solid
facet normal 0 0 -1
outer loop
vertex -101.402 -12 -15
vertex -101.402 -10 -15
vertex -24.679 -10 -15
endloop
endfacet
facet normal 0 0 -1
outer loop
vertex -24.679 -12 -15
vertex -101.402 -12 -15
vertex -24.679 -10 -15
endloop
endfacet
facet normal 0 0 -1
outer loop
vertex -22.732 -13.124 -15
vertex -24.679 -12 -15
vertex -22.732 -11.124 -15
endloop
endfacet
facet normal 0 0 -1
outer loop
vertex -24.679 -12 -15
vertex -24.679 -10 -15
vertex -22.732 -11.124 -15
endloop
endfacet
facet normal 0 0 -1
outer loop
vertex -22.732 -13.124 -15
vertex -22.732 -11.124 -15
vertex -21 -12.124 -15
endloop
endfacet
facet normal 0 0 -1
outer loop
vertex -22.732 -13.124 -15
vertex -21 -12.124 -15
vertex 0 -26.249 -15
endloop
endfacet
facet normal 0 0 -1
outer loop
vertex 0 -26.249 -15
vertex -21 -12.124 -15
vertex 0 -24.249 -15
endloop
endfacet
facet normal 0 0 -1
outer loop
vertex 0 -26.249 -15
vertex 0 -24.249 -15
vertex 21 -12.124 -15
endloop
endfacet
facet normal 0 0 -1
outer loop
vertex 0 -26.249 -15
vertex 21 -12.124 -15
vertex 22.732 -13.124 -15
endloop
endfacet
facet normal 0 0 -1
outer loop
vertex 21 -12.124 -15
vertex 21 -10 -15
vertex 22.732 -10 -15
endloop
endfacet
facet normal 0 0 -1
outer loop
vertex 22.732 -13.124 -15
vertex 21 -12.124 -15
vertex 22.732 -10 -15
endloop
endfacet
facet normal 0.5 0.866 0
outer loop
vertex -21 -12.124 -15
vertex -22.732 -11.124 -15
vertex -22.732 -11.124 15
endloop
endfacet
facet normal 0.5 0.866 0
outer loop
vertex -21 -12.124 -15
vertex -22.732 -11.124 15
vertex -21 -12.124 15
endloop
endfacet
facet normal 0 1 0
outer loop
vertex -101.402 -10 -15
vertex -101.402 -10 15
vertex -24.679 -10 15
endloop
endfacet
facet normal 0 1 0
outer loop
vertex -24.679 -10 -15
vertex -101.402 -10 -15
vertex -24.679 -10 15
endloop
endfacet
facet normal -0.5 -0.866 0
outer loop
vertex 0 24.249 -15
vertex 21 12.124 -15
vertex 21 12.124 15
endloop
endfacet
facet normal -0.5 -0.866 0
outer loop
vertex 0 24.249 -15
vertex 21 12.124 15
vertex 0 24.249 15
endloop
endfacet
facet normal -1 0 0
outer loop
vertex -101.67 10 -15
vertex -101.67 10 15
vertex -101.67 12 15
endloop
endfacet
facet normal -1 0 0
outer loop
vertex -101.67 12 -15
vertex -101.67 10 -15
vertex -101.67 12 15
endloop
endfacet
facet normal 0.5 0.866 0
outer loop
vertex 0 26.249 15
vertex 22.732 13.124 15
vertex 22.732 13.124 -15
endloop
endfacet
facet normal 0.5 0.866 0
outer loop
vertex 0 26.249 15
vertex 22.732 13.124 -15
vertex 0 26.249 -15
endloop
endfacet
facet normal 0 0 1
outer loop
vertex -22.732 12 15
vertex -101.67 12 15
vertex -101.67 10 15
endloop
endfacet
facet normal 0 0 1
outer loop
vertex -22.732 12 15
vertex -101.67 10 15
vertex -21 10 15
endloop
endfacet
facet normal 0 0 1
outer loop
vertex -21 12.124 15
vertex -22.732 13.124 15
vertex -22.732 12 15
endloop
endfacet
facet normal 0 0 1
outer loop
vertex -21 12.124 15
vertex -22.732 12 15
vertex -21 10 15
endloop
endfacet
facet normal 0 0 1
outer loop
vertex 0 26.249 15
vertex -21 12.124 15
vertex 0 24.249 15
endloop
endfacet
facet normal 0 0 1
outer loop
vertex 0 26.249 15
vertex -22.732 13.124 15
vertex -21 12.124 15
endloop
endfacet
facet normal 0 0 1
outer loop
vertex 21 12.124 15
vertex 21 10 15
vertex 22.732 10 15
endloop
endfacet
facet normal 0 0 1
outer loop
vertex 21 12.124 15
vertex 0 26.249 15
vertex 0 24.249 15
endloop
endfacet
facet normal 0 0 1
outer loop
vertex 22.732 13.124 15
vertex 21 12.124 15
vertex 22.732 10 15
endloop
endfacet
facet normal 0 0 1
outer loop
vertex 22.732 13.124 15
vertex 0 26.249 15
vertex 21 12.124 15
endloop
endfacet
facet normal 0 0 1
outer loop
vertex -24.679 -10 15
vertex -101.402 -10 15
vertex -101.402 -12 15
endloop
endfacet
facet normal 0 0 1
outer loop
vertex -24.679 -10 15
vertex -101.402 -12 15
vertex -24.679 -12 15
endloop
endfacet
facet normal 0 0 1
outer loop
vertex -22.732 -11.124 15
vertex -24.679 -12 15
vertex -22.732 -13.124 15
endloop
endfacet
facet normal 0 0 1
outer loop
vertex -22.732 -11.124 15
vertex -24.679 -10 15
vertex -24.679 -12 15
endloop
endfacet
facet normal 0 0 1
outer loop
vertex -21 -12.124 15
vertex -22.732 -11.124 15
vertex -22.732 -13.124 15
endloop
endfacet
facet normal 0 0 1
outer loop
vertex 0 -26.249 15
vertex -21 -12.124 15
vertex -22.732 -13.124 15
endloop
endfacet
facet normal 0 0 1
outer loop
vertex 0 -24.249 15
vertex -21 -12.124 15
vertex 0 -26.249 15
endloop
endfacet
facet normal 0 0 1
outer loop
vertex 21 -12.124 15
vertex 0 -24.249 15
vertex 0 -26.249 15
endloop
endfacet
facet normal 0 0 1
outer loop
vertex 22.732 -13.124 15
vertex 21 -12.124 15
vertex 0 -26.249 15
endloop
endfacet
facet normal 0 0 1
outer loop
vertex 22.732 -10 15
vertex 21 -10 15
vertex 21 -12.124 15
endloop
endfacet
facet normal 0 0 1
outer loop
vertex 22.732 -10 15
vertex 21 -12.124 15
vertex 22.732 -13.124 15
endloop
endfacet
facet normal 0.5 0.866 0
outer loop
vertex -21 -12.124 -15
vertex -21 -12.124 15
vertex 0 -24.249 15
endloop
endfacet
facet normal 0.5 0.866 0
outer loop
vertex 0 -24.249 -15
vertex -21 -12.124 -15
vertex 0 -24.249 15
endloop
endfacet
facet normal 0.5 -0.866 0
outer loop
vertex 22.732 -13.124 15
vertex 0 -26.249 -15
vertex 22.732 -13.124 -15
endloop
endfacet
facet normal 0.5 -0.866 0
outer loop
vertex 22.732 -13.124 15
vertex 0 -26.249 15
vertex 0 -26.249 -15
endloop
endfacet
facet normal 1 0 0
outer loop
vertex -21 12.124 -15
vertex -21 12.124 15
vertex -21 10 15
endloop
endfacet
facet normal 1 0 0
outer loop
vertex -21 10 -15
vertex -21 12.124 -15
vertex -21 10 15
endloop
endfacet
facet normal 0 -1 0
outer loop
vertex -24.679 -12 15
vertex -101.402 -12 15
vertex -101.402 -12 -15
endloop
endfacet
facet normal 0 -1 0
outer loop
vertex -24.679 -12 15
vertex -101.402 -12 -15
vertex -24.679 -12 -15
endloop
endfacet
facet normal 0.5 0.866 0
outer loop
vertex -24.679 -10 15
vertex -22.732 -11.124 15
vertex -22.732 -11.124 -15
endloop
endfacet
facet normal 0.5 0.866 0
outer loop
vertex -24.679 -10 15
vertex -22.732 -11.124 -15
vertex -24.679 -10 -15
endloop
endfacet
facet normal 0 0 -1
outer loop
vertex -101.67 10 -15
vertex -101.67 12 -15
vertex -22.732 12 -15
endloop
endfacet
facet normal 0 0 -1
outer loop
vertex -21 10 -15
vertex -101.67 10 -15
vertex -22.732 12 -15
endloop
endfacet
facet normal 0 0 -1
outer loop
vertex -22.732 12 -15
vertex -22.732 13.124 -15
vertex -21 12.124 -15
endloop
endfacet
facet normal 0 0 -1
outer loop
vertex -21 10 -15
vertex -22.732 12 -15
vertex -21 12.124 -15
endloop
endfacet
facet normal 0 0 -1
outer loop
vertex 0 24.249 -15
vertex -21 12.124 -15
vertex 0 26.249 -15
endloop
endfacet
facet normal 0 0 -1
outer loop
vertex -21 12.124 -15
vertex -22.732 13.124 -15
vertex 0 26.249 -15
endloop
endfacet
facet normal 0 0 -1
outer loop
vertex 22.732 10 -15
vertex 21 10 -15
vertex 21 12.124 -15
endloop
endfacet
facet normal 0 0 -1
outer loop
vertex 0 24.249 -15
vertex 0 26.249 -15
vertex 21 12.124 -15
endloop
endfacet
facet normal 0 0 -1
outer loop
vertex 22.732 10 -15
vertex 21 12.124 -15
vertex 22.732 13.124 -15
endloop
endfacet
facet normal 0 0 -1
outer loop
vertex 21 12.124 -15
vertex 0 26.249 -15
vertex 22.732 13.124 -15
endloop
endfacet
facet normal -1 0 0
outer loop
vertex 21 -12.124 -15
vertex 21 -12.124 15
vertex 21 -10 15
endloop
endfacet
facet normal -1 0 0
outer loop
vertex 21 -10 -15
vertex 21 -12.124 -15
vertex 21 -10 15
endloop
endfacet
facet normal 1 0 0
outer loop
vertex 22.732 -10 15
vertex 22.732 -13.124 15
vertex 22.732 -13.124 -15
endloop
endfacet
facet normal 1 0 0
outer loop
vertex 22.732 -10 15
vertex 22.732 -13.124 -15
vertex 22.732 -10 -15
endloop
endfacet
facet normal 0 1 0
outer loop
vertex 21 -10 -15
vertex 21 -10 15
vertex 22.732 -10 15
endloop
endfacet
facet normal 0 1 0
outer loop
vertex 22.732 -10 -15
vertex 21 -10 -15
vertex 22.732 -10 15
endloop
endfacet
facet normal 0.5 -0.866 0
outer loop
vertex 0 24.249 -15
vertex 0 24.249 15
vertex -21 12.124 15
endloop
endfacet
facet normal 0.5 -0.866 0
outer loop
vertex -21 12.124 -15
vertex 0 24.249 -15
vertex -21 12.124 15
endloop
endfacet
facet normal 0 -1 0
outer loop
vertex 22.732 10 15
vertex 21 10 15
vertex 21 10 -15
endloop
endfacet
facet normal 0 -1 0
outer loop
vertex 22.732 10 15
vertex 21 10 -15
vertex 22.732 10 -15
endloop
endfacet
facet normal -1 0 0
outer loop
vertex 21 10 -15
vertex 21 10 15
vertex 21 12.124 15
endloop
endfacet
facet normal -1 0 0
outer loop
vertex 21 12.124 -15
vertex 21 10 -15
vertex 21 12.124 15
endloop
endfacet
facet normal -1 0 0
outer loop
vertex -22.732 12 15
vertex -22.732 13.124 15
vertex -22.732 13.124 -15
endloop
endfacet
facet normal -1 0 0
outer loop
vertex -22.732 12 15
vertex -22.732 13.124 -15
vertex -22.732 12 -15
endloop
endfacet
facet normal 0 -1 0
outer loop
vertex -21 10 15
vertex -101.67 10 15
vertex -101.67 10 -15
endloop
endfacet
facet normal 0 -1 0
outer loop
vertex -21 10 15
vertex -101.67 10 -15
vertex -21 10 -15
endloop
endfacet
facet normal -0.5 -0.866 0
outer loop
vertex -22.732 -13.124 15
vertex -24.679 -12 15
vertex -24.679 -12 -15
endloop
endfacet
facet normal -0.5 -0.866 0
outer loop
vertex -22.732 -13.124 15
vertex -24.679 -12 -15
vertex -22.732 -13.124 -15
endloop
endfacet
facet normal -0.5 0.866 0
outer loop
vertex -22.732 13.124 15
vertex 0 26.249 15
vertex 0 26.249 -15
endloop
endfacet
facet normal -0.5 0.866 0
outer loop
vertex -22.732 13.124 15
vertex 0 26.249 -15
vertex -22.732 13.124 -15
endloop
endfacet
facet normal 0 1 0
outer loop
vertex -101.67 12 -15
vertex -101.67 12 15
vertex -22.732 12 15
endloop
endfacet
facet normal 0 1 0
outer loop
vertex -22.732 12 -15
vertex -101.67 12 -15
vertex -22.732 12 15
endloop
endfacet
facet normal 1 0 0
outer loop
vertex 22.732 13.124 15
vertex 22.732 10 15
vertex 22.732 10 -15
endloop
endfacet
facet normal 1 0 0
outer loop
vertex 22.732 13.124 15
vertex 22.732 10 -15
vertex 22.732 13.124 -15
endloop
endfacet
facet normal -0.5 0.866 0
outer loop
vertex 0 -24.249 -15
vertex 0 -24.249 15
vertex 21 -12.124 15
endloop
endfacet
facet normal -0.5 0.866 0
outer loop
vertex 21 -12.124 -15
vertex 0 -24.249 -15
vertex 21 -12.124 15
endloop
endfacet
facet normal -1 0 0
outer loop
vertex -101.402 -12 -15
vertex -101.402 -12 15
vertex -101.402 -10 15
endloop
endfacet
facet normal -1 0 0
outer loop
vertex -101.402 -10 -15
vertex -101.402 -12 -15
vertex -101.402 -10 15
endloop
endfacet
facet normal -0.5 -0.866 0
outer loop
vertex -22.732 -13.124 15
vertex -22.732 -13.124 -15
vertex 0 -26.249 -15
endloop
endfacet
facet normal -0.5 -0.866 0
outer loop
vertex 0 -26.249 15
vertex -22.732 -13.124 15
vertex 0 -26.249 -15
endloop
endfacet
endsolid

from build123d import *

# Parameters (mm, degrees)
F1_DEPTH  = 25
F3_DEPTH  = 15
F5_W      = 81.856458
F5_H      = 20
F6_DEPTH  = 15
F7_W      = 76.722559
F7_H      = 2
F8_DEPTH  = 15
F10_DEPTH = 15
F11_W     = 80.67
F11_H     = 2
F12_DEPTH = 15


with BuildPart() as f1:
    # F0 (on Top) → F1 (new body, symmetric)
    with BuildSketch(Plane.XY):
        Polygon((21, -12.124356), (21, 12.124356), (0, 24.248711), (-21, 12.124356), (-21, -12.124356), (0, -24.248711), align=None)
    extrude(amount=F1_DEPTH, both=True)


with BuildPart() as f3:
    # F2 (on Top) → F3 (new body, symmetric)
    with BuildSketch(Plane.XY):
        Polygon((0, -26.248711), (22.732051, -13.124356), (22.732051, 13.124356), (0, 26.248711), (-22.732051, 13.124356), (-22.732051, -13.124356), align=None)
    extrude(amount=F3_DEPTH, both=True)

    # F4: cut F1
    add(f1.part, mode=Mode.SUBTRACT)

    # F5 (on Top) → F6 (cut, symmetric)
    with BuildSketch(Plane.XY):
        Rectangle(F5_W, F5_H)
    extrude(amount=F6_DEPTH, both=True, mode=Mode.SUBTRACT)

    # F7 (on Top) → F8 (join, symmetric)
    with BuildSketch(Plane.XY):
        with Locations((-63.040771, -11)):
            Rectangle(F7_W, F7_H)
        Polygon((-24.679492, -10), (-24.679492, -12), (-22.732051, -12), (-22.732051, -11.124356), align=None)
        Polygon((-24.679492, -12), (-13.486716, -18.462152), (-12.640724, -16.950586), (-22.732051, -11.124356), (-22.732051, -12), align=None)
    extrude(amount=F8_DEPTH, both=True)

    # F9 (on Top) → F10 (cut, symmetric)
    with BuildSketch(Plane.XY):
        Polygon((-25.777998, -9.365777), (-19.458776, -13.014182), (-18.305326, -9.365777), align=None)
    extrude(amount=F10_DEPTH, both=True, mode=Mode.SUBTRACT)

    # F11 (on Top) → F12 (join, symmetric)
    with BuildSketch(Plane.XY):
        with Locations((-61.335, 11)):
            Rectangle(F11_W, F11_H)
    extrude(amount=F12_DEPTH, both=True)


solid = f3.part
